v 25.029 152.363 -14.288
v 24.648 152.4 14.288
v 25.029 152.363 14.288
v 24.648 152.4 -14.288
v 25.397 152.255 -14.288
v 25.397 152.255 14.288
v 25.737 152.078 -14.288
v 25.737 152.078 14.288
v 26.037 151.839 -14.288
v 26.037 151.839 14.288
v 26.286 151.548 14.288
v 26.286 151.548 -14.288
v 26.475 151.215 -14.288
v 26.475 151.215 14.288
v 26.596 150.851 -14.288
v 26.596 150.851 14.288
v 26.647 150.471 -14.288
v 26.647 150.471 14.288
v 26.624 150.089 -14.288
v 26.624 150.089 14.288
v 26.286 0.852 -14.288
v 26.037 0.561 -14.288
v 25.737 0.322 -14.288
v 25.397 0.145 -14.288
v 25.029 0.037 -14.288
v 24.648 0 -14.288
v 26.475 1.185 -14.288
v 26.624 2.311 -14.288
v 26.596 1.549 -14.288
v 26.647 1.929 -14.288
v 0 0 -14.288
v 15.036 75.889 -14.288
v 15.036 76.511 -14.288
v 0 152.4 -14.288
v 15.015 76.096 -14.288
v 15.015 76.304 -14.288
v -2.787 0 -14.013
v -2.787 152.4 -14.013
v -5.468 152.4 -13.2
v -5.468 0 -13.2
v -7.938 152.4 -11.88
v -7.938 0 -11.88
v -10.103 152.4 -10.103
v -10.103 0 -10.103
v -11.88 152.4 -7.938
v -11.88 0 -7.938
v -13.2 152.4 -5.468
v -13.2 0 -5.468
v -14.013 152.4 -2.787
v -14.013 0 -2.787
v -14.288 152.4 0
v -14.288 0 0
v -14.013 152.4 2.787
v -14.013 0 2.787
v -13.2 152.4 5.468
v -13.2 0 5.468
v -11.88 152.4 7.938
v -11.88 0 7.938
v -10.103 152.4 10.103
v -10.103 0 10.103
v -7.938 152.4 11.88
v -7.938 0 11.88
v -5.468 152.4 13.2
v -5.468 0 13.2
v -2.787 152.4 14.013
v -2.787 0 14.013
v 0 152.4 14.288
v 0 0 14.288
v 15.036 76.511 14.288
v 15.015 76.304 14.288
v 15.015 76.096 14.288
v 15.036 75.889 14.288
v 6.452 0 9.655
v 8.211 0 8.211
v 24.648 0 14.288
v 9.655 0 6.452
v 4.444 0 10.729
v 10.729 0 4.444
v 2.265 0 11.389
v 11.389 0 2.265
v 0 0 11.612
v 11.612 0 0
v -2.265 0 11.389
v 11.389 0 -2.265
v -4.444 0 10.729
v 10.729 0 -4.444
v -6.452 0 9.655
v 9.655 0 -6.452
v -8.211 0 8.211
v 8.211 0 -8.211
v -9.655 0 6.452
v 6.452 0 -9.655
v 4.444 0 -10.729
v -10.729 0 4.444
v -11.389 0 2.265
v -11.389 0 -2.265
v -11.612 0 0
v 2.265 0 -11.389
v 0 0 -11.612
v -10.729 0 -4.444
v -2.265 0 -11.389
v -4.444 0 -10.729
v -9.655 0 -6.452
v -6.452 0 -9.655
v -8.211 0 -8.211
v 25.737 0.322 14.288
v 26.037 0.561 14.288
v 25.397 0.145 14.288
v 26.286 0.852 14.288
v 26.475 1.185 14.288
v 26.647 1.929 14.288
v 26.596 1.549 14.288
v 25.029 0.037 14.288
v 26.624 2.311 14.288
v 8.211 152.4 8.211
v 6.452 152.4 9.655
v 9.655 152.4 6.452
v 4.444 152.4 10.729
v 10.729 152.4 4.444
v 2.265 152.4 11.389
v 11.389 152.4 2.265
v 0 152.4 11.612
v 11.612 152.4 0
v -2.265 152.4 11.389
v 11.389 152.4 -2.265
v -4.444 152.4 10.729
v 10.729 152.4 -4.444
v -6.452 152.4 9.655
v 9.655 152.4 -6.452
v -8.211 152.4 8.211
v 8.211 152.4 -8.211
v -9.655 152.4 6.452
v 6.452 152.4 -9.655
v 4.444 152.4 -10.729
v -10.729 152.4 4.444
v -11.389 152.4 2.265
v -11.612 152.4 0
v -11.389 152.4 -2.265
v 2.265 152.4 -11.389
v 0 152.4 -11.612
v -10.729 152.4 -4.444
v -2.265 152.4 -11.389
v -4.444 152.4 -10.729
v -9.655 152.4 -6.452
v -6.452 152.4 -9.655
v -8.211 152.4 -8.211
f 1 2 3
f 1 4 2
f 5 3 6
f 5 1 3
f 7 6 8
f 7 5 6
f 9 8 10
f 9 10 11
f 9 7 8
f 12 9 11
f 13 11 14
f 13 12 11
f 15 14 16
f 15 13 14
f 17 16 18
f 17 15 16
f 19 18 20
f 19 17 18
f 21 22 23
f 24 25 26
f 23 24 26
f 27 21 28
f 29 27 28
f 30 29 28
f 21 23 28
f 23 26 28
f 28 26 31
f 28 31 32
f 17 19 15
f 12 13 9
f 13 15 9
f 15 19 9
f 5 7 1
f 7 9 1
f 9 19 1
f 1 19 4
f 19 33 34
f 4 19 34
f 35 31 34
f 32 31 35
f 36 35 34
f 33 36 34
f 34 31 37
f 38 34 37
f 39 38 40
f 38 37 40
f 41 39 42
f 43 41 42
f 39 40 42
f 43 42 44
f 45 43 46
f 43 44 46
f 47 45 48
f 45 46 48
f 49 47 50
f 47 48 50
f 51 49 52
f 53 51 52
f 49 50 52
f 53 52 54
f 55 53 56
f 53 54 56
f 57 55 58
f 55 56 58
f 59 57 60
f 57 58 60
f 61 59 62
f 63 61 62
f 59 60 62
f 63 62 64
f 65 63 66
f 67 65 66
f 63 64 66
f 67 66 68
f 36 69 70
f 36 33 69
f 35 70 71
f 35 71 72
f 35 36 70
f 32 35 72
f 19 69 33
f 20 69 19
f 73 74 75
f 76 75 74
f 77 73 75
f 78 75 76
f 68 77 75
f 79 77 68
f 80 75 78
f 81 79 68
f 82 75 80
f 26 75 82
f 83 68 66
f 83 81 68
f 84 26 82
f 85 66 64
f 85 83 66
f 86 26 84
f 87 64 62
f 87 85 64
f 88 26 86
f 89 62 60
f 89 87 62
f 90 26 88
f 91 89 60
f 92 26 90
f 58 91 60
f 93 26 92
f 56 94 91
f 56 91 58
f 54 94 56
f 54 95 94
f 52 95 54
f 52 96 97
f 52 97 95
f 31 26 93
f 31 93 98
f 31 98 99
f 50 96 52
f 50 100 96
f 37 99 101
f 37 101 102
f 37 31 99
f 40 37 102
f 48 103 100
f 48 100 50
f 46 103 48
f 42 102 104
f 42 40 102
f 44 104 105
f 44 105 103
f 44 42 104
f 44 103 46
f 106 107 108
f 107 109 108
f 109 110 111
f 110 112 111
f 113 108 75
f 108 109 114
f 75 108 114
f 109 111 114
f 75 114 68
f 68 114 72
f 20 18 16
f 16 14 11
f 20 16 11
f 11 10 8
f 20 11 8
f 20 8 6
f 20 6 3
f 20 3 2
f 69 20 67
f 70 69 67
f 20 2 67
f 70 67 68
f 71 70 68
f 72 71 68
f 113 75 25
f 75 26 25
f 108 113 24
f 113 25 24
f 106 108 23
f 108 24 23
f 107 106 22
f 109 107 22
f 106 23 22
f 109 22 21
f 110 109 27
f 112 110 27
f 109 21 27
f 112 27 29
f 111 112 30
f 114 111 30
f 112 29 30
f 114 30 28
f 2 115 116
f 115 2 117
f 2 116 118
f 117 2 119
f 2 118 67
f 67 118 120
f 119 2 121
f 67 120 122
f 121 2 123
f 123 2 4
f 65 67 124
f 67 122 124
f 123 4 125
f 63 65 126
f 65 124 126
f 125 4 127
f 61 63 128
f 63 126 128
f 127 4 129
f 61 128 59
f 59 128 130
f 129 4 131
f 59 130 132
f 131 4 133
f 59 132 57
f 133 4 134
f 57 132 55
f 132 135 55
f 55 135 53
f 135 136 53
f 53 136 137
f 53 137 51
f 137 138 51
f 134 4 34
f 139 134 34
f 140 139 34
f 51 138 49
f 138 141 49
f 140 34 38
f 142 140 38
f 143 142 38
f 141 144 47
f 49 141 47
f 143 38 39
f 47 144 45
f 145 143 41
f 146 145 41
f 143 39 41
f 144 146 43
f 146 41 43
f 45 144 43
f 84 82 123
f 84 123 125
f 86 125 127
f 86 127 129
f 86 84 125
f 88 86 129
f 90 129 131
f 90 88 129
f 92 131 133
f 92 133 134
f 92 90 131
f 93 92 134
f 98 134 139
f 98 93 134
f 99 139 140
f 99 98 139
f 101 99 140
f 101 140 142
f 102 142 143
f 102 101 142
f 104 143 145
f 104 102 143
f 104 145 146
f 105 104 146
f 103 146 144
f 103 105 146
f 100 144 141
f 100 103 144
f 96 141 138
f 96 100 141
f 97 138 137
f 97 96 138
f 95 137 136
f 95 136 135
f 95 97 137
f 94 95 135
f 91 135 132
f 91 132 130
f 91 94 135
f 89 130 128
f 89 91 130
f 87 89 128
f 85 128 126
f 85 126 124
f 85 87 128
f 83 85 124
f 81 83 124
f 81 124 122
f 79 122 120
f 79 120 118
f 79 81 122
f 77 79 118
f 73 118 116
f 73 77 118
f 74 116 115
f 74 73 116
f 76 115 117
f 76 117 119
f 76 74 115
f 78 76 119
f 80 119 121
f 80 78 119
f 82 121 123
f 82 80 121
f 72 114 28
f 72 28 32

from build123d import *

# Parameters (mm, degrees)
SKETCH1_R           = 14.2875
SKETCH1_R_2         = 11.6125
BOSS_EXTRUDE1_DEPTH = 152.4
SKETCH2_W           = 28.575
SKETCH2_H           = 152.4
BOSS_EXTRUDE2_DEPTH = 12.7
BOSS_EXTRUDE3_DEPTH = 152.4
CUT_EXTRUDE1_DEPTH  = 29.575
FILLET1_R           = 2


with BuildPart() as part:
    # Sketch1 → Boss-Extrude1 (new body)
    with BuildSketch(Plane(origin=(0, 0, 0), x_dir=(1, 0, 0), z_dir=(0, 1, 0))):
        Circle(SKETCH1_R)
        Circle(SKETCH1_R_2, mode=Mode.SUBTRACT)
    extrude(amount=BOSS_EXTRUDE1_DEPTH)



with BuildPart() as body_2:
    # Sketch2 → Boss-Extrude2 (new body)
    with BuildSketch(Plane(origin=(14.2875, 0, 0), x_dir=(0, 0, -1), z_dir=(1, 0, 0))):
        with Locations((0, 76.2)):
            Rectangle(SKETCH2_W, SKETCH2_H)
    extrude(amount=BOSS_EXTRUDE2_DEPTH)


with BuildPart() as part_1:
    add(part.part)

    add(body_2.part)  # Boss-Extrude3 merges body 2
    # Sketch3 → Boss-Extrude3 (add, through all)
    with BuildSketch(Plane(origin=(0, 152.4, 0), x_dir=(1, 0, 0), z_dir=(0, 1, 0))):
        with BuildLine():
            Line((14.2875, -14.2875), (0, -14.2875))
            ThreePointArc((0, -14.2875), (14.2875, 0), (0, 14.2875))
            Line((0, 14.2875), (14.2875, 14.2875))
            Line((14.2875, 14.2875), (26.9875, 14.2875))
            Line((26.9875, 14.2875), (26.9875, -14.2875))
            Line((26.9875, -14.2875), (14.2875, -14.2875))
        make_face()
    extrude(amount=-BOSS_EXTRUDE3_DEPTH)

    # Sketch5 → Cut-Extrude1 (cut, through all)
    with BuildSketch(Plane.XY.offset(14.2875)):
        Polygon((26.9875, 0), (14.9875, 76.2), (26.9875, 152.4), align=None)
    extrude(amount=-CUT_EXTRUDE1_DEPTH, mode=Mode.SUBTRACT)

    # Fillet1
    fillet1_edges = [part_1.edges().sort_by_distance(p)[0] for p in [
        (26.9875, 0, 0),
        (26.9875, 152.4, 0),
        (14.9875, 76.2, 0),
    ]]
    fillet(fillet1_edges, radius=FILLET1_R)


solid = part_1.part
